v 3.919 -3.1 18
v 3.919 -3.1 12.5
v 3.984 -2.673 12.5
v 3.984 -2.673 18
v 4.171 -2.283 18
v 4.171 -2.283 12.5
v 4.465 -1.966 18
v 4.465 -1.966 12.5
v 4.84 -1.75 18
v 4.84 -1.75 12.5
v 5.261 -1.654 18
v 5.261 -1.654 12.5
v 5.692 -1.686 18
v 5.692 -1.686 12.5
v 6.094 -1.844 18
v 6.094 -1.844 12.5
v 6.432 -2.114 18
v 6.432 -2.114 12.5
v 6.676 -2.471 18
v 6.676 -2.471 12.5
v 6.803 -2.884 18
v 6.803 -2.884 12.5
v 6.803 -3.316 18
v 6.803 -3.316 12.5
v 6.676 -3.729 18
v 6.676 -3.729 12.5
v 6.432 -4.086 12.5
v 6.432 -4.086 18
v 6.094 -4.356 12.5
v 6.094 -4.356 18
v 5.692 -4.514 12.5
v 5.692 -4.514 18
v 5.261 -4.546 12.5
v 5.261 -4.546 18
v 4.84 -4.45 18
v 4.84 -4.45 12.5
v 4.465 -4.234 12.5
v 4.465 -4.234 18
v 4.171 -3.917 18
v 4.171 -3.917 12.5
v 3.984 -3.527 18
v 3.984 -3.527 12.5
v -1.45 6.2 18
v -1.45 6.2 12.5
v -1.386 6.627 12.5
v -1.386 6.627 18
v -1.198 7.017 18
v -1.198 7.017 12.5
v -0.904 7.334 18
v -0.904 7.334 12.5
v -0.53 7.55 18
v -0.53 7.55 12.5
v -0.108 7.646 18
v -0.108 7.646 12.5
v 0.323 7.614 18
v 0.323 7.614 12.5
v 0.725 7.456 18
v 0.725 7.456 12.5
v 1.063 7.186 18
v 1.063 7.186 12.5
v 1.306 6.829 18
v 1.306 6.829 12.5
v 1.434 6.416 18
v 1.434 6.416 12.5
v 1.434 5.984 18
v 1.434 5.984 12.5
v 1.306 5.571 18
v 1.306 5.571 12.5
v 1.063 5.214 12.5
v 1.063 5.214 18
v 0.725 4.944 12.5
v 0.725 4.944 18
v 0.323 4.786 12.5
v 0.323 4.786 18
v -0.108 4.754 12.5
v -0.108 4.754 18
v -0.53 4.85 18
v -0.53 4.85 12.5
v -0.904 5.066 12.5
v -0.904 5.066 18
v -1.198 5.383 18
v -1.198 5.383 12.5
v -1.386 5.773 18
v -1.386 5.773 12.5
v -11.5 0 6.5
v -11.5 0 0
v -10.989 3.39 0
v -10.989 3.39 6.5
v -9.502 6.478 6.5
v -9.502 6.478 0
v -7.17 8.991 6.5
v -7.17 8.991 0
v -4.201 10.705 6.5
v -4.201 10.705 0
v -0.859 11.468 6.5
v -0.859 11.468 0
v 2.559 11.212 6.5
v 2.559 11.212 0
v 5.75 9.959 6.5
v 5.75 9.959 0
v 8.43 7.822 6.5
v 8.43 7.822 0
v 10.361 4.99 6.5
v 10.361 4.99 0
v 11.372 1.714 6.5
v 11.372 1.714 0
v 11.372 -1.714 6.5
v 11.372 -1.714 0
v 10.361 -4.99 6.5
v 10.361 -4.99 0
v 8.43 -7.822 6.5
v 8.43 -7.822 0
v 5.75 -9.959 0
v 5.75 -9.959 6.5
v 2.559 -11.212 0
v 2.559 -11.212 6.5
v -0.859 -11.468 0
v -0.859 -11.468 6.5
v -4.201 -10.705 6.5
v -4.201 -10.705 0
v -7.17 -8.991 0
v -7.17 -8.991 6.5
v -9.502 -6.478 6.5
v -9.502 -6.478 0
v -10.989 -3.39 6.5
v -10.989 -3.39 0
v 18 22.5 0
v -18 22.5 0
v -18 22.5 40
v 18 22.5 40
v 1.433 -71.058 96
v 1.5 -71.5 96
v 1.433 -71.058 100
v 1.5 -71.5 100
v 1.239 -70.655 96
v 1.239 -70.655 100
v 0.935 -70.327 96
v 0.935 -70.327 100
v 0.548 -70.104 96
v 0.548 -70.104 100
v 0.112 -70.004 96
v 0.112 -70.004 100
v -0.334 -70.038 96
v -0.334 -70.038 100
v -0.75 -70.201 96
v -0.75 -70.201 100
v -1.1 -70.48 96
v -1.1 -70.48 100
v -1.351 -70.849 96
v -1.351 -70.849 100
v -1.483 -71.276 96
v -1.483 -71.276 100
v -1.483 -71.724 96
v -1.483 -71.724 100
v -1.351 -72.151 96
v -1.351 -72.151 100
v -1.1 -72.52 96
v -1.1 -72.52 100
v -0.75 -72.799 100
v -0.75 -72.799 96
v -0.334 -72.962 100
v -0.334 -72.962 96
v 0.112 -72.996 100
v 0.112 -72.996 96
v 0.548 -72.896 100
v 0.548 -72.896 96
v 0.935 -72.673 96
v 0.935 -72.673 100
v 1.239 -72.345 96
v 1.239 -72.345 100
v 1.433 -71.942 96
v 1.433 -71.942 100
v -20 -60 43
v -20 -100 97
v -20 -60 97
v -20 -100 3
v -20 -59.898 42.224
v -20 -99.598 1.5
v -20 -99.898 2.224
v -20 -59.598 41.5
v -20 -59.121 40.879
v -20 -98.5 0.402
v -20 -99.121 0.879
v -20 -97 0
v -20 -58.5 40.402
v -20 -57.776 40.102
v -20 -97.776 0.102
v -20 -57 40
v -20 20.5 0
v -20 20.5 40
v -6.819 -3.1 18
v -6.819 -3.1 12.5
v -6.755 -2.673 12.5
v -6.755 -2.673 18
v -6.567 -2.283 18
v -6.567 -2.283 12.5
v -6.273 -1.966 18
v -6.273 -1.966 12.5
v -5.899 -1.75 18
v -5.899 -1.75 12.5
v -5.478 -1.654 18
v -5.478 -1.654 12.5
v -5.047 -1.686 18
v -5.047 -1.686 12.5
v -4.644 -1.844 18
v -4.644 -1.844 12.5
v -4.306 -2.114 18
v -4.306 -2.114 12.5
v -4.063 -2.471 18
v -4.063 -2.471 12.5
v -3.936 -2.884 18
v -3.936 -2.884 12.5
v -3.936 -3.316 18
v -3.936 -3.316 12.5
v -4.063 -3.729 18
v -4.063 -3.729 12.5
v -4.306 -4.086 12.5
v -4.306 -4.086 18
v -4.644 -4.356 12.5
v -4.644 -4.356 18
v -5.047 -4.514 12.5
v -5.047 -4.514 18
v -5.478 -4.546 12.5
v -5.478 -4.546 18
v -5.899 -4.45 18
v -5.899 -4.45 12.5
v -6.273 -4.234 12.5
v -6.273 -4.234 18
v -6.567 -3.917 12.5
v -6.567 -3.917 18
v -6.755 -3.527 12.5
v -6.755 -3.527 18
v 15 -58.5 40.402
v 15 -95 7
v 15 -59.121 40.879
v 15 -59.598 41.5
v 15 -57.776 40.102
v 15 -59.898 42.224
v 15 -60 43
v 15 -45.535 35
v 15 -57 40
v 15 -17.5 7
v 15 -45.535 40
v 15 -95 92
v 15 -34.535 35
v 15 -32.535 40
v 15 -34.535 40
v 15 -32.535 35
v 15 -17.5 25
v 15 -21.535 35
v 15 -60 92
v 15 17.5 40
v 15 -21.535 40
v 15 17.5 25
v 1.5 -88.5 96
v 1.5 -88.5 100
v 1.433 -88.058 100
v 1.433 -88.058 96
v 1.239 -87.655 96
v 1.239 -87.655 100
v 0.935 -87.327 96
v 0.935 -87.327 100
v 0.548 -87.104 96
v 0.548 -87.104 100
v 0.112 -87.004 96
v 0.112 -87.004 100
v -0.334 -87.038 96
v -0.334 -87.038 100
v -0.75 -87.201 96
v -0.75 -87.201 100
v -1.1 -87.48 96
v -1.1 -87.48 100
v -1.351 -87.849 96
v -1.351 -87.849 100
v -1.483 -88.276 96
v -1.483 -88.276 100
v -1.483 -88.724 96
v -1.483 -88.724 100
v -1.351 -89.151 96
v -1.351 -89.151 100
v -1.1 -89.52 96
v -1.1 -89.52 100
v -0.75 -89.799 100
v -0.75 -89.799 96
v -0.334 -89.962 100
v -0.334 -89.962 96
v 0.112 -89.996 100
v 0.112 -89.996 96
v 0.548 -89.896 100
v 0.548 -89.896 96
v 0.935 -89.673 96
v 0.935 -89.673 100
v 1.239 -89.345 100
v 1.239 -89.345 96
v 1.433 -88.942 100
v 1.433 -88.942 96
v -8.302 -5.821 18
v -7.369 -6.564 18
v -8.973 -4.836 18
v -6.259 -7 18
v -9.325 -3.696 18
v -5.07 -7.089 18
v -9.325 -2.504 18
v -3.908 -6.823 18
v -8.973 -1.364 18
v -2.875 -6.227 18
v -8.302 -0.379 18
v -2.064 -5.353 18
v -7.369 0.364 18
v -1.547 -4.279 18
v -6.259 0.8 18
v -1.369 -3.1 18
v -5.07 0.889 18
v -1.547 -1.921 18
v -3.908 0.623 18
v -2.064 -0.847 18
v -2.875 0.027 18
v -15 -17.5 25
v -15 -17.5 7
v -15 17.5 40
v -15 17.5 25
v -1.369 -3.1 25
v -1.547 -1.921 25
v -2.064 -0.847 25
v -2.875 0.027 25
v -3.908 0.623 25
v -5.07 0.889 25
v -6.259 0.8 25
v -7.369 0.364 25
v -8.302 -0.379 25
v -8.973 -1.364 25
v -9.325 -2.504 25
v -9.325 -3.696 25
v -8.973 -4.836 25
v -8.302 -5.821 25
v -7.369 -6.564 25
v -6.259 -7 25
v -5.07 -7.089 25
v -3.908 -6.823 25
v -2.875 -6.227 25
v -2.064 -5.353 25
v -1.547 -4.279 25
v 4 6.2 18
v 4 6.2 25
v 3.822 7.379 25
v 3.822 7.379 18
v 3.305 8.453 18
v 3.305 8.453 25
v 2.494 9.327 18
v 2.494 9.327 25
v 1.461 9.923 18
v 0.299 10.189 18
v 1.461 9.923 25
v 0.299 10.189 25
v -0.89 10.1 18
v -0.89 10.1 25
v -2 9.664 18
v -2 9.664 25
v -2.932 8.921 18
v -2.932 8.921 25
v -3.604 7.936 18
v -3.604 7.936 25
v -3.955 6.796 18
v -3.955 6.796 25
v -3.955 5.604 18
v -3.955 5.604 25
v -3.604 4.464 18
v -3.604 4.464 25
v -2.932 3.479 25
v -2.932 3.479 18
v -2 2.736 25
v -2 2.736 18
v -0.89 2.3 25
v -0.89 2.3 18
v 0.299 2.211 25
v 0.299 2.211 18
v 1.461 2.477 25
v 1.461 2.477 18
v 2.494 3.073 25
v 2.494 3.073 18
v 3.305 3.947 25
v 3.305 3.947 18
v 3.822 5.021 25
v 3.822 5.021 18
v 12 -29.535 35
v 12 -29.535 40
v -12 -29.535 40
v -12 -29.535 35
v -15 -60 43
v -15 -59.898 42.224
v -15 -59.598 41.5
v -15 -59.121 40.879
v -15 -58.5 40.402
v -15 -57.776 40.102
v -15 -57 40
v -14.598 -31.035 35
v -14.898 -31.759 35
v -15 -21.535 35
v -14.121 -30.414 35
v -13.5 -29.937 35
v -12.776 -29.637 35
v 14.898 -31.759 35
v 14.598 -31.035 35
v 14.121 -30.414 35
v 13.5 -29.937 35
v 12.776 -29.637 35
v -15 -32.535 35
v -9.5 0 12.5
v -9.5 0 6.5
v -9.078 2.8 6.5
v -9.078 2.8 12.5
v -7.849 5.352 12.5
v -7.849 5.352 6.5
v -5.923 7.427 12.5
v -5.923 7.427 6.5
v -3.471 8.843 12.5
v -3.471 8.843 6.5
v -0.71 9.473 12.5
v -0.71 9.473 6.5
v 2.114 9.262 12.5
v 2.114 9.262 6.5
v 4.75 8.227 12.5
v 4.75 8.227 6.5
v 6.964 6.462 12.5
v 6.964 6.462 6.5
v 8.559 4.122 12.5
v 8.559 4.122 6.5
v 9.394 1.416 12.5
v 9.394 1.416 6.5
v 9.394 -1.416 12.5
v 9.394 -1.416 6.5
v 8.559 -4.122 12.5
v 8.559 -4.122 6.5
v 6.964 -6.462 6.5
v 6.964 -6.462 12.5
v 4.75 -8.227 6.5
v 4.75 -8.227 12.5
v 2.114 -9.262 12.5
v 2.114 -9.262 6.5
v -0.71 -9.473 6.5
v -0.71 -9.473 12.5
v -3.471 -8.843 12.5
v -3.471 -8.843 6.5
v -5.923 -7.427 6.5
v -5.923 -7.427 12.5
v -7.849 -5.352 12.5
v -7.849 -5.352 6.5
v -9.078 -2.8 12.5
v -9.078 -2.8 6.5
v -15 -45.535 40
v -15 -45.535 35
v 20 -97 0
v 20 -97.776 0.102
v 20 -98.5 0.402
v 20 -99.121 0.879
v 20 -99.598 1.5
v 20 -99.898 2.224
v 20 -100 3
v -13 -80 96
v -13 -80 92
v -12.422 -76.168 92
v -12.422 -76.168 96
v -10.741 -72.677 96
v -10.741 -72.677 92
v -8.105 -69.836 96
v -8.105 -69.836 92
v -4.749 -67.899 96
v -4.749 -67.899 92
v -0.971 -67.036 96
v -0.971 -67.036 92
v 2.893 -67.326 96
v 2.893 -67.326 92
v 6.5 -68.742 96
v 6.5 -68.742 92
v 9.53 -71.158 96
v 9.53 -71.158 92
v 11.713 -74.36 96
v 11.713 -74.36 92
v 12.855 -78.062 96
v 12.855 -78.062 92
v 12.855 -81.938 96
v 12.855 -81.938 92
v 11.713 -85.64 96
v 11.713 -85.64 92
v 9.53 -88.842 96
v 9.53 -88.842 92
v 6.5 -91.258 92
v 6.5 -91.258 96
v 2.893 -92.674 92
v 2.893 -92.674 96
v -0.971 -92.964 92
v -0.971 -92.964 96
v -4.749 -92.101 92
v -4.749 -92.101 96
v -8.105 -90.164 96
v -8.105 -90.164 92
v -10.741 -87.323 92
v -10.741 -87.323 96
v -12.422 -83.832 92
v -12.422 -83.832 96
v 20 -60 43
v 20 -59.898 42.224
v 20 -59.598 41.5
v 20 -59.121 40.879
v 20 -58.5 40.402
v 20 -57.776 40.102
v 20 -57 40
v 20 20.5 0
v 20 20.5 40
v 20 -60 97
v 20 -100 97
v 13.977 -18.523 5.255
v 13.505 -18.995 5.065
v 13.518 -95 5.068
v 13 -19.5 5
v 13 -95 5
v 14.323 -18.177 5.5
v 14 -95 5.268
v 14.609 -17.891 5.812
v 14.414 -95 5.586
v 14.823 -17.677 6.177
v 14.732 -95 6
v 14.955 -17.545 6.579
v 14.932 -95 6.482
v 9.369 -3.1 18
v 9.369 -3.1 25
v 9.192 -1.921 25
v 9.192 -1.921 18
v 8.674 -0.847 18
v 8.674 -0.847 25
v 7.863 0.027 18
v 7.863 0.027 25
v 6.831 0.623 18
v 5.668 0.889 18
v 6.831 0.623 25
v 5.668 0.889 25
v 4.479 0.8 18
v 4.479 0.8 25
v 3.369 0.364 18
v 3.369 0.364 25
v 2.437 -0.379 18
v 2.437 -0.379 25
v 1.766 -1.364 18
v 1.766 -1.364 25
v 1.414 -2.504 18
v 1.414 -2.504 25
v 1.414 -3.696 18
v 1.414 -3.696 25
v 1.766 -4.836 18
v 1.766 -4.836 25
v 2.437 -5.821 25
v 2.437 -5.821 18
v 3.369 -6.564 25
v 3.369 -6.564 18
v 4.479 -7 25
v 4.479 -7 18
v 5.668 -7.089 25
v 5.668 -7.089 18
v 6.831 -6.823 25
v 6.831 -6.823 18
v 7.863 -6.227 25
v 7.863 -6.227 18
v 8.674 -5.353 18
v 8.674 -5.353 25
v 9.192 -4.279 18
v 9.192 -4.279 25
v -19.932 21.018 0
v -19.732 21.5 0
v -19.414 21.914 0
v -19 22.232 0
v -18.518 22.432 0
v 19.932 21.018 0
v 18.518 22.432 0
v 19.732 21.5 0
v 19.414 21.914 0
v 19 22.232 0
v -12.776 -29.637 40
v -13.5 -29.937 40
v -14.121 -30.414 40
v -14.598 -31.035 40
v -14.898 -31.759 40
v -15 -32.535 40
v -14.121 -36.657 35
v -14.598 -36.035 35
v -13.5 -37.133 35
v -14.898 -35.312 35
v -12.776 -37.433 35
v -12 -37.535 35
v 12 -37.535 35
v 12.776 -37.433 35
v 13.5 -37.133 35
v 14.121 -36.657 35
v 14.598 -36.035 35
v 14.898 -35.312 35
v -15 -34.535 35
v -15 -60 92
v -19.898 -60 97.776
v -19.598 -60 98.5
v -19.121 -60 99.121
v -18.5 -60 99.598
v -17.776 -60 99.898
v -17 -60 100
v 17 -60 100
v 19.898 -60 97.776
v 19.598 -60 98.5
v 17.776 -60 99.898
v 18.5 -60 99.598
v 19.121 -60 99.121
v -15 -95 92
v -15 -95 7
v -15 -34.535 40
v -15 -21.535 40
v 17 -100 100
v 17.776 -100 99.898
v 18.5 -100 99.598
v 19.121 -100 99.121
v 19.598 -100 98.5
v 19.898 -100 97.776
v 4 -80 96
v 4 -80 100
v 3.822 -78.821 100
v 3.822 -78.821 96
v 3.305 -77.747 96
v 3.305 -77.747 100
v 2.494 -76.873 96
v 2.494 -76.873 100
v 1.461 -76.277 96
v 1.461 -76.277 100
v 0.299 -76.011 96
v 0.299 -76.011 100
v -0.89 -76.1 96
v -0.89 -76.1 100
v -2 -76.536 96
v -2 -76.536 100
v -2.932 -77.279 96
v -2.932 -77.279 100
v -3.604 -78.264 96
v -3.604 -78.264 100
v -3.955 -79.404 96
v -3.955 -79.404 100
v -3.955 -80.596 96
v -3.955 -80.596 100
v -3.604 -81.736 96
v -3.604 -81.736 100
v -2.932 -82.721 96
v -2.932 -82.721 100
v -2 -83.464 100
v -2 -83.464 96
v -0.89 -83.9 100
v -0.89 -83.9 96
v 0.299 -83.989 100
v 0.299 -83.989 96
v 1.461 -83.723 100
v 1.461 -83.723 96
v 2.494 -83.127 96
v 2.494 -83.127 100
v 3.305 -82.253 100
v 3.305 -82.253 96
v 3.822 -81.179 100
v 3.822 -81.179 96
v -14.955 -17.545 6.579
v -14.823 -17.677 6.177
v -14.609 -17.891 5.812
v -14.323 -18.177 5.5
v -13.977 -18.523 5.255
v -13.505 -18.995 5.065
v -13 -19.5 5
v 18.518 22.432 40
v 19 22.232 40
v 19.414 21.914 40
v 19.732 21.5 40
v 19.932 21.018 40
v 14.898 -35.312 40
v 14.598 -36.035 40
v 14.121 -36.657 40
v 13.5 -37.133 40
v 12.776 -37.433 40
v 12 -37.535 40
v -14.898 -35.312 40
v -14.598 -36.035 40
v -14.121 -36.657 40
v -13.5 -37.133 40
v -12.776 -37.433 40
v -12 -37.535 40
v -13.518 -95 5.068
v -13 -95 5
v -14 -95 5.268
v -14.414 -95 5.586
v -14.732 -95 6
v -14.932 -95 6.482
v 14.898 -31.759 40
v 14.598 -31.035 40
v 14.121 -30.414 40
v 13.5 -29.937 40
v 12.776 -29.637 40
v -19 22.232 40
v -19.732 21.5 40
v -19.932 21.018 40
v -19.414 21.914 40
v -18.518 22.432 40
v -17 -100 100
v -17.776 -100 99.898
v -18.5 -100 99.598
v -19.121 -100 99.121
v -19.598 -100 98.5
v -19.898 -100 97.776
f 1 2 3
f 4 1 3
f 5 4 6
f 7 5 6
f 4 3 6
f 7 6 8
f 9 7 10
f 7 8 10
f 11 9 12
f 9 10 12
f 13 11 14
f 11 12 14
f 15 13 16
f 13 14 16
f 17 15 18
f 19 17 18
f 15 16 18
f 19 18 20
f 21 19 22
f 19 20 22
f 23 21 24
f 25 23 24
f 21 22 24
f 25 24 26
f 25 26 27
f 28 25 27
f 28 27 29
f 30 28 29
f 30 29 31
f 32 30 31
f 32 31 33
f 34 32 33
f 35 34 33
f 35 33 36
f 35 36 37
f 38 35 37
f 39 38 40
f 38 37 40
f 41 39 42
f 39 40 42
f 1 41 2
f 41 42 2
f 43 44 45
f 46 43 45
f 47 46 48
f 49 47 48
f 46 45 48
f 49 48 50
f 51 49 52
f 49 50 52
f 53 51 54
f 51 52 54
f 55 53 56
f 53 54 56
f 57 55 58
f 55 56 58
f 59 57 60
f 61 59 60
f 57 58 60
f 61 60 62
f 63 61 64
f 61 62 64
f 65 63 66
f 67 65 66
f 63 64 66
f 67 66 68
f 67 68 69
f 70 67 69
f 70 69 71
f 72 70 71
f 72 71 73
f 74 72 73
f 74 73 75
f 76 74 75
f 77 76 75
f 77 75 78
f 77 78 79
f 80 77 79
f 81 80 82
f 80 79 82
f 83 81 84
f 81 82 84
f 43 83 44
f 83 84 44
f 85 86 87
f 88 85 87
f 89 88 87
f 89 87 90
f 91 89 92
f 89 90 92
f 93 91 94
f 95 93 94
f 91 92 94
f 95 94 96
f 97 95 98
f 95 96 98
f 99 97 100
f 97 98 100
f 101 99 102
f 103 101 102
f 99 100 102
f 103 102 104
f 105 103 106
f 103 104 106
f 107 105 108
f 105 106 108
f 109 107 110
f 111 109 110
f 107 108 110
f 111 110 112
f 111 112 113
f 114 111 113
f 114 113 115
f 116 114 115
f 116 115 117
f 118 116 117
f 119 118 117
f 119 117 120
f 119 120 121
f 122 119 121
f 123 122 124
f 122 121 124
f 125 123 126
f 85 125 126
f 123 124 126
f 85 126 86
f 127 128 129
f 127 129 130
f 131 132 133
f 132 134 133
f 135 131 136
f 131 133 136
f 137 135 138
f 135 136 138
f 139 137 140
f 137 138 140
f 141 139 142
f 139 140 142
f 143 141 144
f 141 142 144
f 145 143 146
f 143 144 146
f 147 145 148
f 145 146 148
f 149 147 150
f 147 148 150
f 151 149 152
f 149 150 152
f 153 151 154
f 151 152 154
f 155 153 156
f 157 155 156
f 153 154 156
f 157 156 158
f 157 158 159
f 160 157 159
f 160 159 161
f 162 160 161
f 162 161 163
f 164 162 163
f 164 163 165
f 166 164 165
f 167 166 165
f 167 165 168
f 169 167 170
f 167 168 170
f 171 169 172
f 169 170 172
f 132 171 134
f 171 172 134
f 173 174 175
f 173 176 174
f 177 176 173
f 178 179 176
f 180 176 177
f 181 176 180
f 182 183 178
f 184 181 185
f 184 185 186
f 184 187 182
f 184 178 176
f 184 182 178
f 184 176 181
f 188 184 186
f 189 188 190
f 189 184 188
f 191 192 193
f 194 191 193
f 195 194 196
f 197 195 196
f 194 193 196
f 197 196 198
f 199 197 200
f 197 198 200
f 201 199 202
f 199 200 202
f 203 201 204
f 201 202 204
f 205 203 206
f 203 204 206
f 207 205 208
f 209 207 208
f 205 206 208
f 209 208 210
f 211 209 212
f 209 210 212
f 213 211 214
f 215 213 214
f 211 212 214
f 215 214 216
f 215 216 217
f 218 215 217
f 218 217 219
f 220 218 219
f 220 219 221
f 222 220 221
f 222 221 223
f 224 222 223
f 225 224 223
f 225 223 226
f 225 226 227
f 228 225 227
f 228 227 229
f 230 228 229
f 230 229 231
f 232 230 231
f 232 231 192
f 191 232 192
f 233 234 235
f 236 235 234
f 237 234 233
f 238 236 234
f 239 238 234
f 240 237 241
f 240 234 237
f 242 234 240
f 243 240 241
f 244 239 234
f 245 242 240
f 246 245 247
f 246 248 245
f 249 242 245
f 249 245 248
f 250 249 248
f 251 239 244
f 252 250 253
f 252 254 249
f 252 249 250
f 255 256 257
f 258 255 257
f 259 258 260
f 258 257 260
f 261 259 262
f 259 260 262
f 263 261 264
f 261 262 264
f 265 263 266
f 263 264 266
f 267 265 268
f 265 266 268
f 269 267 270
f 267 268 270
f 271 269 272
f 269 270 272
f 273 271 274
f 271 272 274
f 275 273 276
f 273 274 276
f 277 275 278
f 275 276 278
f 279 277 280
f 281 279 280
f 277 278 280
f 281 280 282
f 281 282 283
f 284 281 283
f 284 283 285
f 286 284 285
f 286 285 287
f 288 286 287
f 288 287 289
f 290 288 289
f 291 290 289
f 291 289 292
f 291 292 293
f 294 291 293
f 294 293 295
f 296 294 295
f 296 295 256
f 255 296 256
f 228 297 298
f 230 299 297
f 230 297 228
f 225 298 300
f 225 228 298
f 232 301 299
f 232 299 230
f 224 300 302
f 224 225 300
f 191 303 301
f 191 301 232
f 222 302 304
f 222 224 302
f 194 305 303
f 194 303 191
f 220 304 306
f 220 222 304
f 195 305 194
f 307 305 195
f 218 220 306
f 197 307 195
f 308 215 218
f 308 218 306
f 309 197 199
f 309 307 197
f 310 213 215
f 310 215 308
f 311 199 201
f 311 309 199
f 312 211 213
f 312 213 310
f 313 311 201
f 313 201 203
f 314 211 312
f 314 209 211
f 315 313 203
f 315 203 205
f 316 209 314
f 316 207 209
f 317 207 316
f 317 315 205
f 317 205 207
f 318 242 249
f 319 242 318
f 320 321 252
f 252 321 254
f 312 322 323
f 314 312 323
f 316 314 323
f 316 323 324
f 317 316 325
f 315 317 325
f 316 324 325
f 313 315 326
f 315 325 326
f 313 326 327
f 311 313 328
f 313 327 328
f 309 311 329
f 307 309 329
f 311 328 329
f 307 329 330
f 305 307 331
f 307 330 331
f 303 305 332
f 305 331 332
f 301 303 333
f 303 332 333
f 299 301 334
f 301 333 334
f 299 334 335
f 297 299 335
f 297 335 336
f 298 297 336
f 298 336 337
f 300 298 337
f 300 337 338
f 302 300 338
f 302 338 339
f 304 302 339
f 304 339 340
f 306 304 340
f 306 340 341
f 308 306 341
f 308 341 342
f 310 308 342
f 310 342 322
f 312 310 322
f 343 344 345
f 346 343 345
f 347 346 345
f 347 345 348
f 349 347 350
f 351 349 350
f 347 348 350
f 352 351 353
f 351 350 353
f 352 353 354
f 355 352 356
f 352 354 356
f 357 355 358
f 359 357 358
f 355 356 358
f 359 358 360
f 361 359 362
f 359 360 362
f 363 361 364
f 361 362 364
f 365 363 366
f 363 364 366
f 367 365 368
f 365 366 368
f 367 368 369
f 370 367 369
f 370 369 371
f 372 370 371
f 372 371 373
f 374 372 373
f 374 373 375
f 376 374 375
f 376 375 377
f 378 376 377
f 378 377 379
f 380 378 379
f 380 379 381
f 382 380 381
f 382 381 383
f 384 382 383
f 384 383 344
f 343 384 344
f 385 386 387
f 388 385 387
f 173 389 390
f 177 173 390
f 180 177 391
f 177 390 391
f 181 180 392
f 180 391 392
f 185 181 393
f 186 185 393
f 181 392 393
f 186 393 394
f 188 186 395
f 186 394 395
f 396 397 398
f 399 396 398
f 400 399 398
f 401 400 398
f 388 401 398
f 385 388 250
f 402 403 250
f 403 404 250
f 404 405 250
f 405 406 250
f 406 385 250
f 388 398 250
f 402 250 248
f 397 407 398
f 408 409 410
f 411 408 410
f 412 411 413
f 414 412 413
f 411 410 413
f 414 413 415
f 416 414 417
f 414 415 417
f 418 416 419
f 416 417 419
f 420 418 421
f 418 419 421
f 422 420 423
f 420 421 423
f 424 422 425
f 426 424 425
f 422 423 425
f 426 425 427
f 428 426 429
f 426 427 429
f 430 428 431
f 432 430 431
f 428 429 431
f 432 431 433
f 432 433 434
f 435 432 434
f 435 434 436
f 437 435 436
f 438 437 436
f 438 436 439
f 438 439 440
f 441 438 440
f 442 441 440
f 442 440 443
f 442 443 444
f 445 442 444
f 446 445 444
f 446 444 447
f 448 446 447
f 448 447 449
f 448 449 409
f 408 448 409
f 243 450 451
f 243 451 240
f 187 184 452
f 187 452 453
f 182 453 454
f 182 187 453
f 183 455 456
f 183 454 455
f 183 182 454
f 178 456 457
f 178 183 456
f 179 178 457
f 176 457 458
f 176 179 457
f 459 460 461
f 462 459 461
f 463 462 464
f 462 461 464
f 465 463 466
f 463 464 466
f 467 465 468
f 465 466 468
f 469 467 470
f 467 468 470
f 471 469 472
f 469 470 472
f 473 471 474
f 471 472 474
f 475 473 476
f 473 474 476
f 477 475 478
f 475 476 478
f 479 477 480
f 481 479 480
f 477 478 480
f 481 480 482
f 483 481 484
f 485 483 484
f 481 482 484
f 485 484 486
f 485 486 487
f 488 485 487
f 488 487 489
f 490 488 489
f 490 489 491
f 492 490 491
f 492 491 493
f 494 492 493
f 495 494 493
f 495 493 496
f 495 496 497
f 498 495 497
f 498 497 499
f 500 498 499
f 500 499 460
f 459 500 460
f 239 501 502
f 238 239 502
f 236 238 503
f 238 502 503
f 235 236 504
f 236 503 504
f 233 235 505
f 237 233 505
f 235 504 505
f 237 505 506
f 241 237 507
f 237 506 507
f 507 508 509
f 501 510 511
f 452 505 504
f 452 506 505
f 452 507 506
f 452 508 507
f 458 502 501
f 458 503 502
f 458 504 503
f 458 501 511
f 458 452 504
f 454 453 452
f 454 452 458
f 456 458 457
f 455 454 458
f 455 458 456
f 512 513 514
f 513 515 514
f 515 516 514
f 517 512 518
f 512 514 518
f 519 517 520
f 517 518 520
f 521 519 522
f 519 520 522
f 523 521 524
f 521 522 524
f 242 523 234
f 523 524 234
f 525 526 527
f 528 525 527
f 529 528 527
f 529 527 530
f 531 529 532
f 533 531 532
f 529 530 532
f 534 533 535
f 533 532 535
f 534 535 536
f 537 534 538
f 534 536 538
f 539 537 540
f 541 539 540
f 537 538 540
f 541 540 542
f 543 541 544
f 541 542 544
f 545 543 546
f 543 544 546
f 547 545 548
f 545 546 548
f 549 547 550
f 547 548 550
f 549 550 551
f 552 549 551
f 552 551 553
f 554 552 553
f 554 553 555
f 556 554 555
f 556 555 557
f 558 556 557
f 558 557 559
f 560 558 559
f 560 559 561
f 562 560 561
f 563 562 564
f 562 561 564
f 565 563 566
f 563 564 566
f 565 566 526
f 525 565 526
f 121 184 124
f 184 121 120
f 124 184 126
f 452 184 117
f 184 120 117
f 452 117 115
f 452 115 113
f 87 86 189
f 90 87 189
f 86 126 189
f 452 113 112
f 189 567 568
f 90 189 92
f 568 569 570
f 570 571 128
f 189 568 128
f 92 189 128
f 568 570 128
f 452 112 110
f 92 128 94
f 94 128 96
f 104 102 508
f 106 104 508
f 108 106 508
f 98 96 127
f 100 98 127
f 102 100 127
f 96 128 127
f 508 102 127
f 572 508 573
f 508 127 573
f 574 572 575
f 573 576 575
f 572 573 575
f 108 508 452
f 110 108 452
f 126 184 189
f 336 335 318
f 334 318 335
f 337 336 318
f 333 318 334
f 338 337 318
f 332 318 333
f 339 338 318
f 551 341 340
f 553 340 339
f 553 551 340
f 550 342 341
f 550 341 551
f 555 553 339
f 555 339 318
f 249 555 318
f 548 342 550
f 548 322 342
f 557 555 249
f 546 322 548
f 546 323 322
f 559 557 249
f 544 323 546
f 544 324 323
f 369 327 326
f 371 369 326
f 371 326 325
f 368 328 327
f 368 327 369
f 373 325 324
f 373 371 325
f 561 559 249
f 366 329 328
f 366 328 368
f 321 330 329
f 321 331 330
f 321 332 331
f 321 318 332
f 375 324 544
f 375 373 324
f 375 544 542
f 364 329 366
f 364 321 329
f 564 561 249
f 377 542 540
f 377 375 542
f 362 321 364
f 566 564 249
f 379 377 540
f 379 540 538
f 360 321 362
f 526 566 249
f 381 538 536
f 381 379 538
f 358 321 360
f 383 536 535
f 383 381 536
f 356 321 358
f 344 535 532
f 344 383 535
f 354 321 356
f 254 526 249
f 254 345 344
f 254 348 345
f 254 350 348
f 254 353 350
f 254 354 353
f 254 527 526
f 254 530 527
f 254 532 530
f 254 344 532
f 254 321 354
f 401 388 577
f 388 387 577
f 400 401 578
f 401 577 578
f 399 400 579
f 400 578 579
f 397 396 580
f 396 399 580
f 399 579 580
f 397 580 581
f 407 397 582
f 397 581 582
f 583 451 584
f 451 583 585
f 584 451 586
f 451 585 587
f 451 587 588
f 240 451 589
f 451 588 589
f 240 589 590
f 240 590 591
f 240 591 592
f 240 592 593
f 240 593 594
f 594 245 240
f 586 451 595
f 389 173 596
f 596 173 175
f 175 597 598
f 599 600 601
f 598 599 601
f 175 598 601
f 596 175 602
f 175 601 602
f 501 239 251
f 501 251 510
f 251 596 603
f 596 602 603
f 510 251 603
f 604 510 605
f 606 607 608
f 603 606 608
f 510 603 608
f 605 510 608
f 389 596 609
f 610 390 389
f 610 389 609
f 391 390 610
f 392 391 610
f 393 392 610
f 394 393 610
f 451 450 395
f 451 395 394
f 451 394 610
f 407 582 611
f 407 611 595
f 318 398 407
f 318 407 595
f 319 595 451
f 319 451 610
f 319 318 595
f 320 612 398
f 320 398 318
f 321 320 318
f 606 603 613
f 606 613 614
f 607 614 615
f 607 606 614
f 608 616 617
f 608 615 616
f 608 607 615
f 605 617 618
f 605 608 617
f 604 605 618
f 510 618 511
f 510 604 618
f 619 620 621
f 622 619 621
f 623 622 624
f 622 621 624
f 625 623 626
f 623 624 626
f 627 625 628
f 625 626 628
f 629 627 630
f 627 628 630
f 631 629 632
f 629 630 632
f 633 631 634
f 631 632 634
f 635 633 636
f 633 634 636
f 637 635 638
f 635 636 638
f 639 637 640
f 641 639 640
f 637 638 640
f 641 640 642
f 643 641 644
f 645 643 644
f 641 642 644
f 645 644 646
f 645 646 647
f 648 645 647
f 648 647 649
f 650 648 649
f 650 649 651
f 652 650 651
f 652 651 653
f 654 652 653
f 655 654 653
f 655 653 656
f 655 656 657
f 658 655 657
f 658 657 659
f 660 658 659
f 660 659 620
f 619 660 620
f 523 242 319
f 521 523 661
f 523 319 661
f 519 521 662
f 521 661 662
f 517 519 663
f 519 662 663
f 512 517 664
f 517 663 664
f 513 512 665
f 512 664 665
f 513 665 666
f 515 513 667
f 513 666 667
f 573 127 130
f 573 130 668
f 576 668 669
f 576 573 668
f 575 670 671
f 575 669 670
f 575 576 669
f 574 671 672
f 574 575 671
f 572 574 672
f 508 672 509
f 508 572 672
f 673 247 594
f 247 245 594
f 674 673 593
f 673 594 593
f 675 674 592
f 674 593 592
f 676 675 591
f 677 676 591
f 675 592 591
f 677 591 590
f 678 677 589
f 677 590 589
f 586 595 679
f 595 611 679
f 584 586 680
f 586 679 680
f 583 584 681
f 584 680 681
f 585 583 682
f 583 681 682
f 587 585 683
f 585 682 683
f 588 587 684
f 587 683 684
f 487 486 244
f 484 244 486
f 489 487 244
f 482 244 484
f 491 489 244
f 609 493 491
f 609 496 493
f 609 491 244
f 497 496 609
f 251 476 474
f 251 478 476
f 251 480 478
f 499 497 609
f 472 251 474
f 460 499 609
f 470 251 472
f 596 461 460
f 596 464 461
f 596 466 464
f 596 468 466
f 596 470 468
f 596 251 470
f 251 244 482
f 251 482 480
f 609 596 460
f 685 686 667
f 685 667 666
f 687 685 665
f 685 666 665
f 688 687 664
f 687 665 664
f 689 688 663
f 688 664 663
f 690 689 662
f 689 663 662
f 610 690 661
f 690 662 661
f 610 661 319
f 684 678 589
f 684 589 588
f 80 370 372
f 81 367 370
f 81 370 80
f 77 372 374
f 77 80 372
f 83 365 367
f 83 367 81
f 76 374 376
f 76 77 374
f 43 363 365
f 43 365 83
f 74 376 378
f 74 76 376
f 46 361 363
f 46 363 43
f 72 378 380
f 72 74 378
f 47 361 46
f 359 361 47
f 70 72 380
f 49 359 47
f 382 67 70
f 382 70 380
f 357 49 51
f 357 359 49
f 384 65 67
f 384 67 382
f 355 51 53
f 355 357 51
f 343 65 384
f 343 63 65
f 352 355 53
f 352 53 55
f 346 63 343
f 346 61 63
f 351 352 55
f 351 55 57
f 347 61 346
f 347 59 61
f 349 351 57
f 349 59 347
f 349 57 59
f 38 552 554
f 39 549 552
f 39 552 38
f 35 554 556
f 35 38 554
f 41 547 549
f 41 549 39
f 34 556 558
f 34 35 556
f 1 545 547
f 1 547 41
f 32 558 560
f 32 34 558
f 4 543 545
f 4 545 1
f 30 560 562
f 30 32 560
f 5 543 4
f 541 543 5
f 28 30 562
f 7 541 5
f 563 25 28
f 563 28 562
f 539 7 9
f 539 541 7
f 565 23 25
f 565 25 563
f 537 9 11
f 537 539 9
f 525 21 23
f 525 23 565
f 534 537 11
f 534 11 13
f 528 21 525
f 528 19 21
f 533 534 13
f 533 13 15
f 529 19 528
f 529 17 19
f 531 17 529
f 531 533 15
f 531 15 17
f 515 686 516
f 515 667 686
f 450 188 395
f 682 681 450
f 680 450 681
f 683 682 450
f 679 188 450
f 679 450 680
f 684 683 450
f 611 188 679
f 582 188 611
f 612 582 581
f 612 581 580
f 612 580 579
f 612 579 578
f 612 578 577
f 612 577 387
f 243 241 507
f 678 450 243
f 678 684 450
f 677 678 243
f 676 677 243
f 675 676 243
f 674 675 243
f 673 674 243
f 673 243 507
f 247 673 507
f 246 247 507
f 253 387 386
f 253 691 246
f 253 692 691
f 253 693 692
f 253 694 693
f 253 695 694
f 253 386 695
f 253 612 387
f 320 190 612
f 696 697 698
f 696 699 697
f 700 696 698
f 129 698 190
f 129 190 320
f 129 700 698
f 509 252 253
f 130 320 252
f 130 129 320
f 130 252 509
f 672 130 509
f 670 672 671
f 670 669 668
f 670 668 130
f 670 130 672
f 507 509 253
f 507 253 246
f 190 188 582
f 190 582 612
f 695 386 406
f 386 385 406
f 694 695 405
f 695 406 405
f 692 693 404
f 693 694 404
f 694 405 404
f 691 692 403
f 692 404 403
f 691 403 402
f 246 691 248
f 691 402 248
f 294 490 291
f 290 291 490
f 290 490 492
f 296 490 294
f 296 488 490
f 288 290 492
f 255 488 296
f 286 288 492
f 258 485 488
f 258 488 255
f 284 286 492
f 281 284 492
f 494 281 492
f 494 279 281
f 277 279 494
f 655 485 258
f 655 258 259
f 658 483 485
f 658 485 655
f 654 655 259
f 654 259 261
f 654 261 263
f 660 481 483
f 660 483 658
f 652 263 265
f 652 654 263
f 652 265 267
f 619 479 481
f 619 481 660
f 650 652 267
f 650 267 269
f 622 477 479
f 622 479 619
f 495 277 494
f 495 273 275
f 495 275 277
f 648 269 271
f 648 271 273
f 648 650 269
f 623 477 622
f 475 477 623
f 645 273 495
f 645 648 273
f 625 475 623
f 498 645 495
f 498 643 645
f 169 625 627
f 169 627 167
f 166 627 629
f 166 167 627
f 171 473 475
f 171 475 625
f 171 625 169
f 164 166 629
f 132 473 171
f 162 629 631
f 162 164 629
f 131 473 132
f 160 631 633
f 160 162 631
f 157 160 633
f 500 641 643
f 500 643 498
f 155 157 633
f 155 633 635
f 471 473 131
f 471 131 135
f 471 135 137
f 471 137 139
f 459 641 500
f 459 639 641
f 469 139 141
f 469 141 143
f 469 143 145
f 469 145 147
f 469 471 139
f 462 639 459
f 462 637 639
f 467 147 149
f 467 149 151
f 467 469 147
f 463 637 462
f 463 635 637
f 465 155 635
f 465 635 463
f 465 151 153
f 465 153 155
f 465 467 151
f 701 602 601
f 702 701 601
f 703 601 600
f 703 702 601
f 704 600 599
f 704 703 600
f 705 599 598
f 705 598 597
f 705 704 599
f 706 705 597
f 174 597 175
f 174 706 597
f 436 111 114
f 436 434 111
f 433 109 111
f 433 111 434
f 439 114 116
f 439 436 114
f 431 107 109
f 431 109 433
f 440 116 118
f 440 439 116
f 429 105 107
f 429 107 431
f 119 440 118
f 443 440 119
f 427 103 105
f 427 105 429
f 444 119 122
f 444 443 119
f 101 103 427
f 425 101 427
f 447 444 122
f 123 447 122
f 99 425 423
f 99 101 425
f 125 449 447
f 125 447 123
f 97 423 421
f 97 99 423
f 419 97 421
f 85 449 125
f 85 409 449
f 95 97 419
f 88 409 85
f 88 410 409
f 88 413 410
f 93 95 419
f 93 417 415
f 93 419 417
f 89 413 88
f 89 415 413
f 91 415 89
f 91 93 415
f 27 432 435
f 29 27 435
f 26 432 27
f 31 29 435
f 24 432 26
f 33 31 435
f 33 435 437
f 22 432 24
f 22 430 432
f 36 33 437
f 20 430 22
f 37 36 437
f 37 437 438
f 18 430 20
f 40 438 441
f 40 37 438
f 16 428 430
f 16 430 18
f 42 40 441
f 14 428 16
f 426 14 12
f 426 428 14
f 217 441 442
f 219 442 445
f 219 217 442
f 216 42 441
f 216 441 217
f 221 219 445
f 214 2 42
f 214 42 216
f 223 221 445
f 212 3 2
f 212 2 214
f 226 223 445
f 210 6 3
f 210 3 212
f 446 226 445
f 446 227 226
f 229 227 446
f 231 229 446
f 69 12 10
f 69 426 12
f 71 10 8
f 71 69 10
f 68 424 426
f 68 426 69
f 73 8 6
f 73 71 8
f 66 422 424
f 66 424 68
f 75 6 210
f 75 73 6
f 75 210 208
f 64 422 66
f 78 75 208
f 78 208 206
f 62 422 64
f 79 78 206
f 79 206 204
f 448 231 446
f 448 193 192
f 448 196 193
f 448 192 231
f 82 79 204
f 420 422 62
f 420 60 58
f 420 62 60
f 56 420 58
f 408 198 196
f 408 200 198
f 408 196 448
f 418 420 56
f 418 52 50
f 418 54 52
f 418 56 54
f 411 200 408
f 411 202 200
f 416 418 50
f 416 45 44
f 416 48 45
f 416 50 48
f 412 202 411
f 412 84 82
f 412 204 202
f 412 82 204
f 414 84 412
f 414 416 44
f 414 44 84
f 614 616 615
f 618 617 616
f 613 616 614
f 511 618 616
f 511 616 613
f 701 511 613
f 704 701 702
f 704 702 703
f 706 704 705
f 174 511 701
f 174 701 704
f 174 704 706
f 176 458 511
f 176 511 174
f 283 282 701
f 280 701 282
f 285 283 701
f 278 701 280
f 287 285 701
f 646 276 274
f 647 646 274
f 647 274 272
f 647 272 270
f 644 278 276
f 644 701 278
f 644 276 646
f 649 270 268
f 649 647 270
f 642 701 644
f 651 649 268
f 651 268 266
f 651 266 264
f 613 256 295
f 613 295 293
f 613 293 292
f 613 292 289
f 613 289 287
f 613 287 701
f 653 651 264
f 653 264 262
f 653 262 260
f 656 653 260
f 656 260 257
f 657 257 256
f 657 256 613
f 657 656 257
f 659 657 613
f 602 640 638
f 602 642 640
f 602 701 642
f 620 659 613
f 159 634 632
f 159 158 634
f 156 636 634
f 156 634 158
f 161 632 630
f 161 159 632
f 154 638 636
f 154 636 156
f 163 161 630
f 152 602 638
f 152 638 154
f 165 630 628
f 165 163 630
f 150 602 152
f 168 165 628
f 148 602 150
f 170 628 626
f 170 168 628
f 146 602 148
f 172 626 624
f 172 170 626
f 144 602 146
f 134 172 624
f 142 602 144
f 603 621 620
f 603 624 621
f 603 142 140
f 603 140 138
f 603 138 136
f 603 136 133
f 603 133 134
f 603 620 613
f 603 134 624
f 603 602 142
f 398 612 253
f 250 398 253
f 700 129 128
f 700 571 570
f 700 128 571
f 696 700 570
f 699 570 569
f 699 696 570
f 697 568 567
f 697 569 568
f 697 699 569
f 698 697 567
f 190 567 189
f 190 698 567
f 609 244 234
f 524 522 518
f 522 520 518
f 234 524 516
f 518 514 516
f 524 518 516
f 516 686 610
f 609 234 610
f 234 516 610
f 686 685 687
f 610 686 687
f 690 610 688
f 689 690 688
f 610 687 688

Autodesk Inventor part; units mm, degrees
ref_plane "YZ Plane" through (0, 0, 0) normal (1, 0, 0) x (0, 1, 0)
ref_plane "XZ Plane" through (0, 0, 0) normal (0, 1, 0) x (-1, 0, 0)
ref_plane "XY Plane" through (0, 0, 0) normal (0, 0, 1) x (1, 0, 0)
sketch "Sketch1" plane through (0, 0, 0) normal (0, 0, 1) x (1, 0, 0)
  line L0 (-20, 22.5) -> (20, 22.5)
  line L1 (20, 22.5) -> (20, -100)
  line L2 (20, -100) -> (-20, -100)
  line L3 (-20, -100) -> (-20, 22.5)
  circle A0 centre (0, 0) radius 2.5
  dimension "d0" = 122.5
  dimension "d1" = 40
  dimension "d2" = 20
  dimension "d3" = 22.5
  dimension "d4" = 5
extrude "Extrusion1" add sketch "Sketch1" along normal blind 5
sketch "Sketch2" plane through (0, 0, 5) normal (0, 0, 1) x (1, 0, 0)
  line L0 (20, 22.5) -> (-20, 22.5) projected
  line L1 (-20, -100) -> (20, -100) projected
  line L2 (-20, 22.5) -> (20, 22.5)
  line L3 (20, 22.5) -> (20, -100)
  line L4 (20, -100) -> (-20, -100)
  line L5 (-20, -100) -> (-20, 22.5)
  line L6 (15, -95) -> (-15, -95)
  line L7 (-15, -95) -> (-15, 17.5)
  line L8 (-15, 17.5) -> (15, 17.5)
  line L9 (15, 17.5) -> (15, -95)
  point P0 (0, 0)
  dimension "d7" = 5
  dimension "d8" = 5
  dimension "d9" = 5
  dimension "d10" = 5
extrude "Extrusion2" add sketch "Sketch2" along normal blind 35
sketch "Sketch3" plane through (-20, -100, 0) normal (0, -1, 0) x (1, 0, 0)
  circle A0 centre (20, 20) radius 8.5
  line L0 (40, 0) -> (40, 40) projected
  line L1 (0, 0) -> (40, 0) projected
  circle A1 centre (20, 11.5) radius 1.5
  circle A2 centre (20, 28.5) radius 1.5
  circle A3 centre (20, 20) radius 3.75
  line L2 (0, 0) -> (0, 40) projected
  point P0 (20, 0)
  dimension "d13" = 20
  dimension "d14" = 20
  dimension "d15" = 17
  dimension "d16" = 3
  dimension "d17" = 7.5
  dimension "d18" = 3
  dimension "d19" = 20
  dimension "d20" = 20
sketch "Sketch4" plane through (0, 0, 5) normal (0, 0, 1) x (1, 0, 0)
  line L0 (-15, 17.5) -> (-15, -95) projected
  line L1 (15, 17.5) -> (15, -95) projected
  line L2 (-15, 17.5) -> (15, 17.5)
  line L3 (15, 17.5) -> (15, -17.5)
  line L4 (15, -17.5) -> (-15, -17.5)
  line L5 (-15, -17.5) -> (-15, 17.5)
  point P0 (0, 0)
  point P1 (-15, -17.5)
  dimension "d21" = 35
extrude "Extrusion3" add sketch "Sketch4" along normal blind 20
sketch "Sketch5" plane through (0, 0, 0) normal (0, 0, -1) x (-1, 0, 0)
  circle A0 centre (0, 0) radius 2.5 projected
  circle A1 centre (0, 0) radius 9.5
  dimension "d24" = 19
extrude "Extrusion4" cut sketch "Sketch5" against normal blind 12.5 contours A0 | A1
sketch "Sketch6" plane through (0, 0, 0) normal (0, 0, -1) x (-1, 0, 0)
  circle A0 centre (0, 0) radius 11.5
  dimension "d27" = 23
extrude "Extrusion5" cut sketch "Sketch6" against normal blind 6.5
fillet "Fillet1" radius 2 2 edges at (-20, 22.5, 20) (20, 22.5, 20)
sketch "Sketch7" plane through (0, 0, 0) normal (0, 0, -1) x (-1, 0, 0)
  circle A0 centre (0, 0) radius 6.2
  circle A1 centre (0, 6.2) radius 1.45
  line L0 (0, 6.2) -> (0, 0)
  line L1 (0, 0) -> (6.4707, -3.7359)
  line L2 (0, 0) -> (-6.6791, -3.8562)
  circle A2 centre (5.3694, -3.1) radius 1.45
  circle A3 centre (-5.3694, -3.1) radius 1.45
  dimension "d31" = 12.4
  dimension "d32" = 120
  dimension "d33" = 120
  dimension "d34" = 2.9
  dimension "d35" = 2.9
  dimension "d36" = 2.9
extrude "Extrusion6" cut sketch "Sketch7" against normal blind 25 contours A1 L0 A0 | A0 A1 | A2 A0 | A0 L1 A2 | L0 A1 A0 | A0 A2 L1 | A3 L2 A0 | A0 L2 A3 | A3 A0 L2 | A3 L2 A0
sketch "Sketch8" plane through (0, 0, 25) normal (0, 0, 1) x (1, 0, 0)
  circle A0 centre (5.3694, -3.1) radius 1.45 projected
  circle A1 centre (5.3694, -3.1) radius 4
  circle A2 centre (-5.3694, -3.1) radius 1.45 projected
  circle A3 centre (-5.3694, -3.1) radius 4
  circle A4 centre (0, 6.2) radius 1.45 projected
  circle A5 centre (0, 6.2) radius 4
  point P0 (0, 0)
  dimension "d39" = 8
  dimension "d40" = 8
  dimension "d41" = 8
extrude "Extrusion7" cut sketch "Sketch8" against normal blind 7
fillet "Fillet2" radius 2 3 edges at (0, -17.5, 5) (-15, -56.25, 5) (15, -56.25, 5)
sketch "Sketch9" plane through (0, 0, 40) normal (0, 0, 1) x (1, 0, 0)
  line L0 (20, -100) -> (20, 20.5) projected
  line L1 (-20, 20.5) -> (-20, -100) projected
  line L2 (20, -100) -> (-20, -100)
  line L3 (-20, -100) -> (-20, -60)
  line L4 (-20, -60) -> (20, -60)
  line L5 (20, -60) -> (20, -100)
  line L6 (0, -60) -> (-20, -60)
  line L7 (-20, -60) -> (-20, -100)
  line L8 (-20, -100) -> (0, -100)
  line L9 (0, -100) -> (0, -60)
  line L10 (15, -95) -> (-15, -95) projected
  line L11 (15, -65) -> (-15, -65)
  line L12 (-15, -65) -> (-15, -95)
  line L13 (-15, -95) -> (15, -95)
  line L14 (15, -95) -> (15, -65)
  point P0 (0, 0)
  dimension "d45" = 40
  dimension "d46" = 5
  dimension "d47" = 5
extrude "Extrusion8" add sketch "Sketch9" along normal blind 60 contours L2 L9 L10 L14 L11 L4 L0 | L2 L1 L4 L9 L11 L12 L10
sketch "Sketch10" plane through (0, 0, 100) normal (0, 0, 1) x (1, 0, 0)
  line L0 (-20, -100) -> (20, -100) projected
  line L1 (20, -100) -> (20, 20.5) projected
  line L2 (-20, -100) -> (20, -100)
  line L3 (20, -100) -> (20, -60)
  line L4 (20, -60) -> (-20, -60)
  line L5 (-20, -60) -> (-20, -100)
  point P0 (0, 0)
  dimension "d50" = 40
extrude "Extrusion9" add sketch "Sketch10" against normal blind 5
sketch "Sketch11" plane through (0, 0, 100) normal (0, 0, 1) x (1, 0, 0)
  circle A0 centre (0, -80) radius 8.5
  line L0 (20, -100) -> (20, -60) projected
  line L1 (-20, -100) -> (20, -100) projected
  circle A1 centre (0, -71.5) radius 1.5
  circle A2 centre (0, -88.5) radius 1.5
  line L2 (-20, -60) -> (-20, -100) projected
  circle A3 centre (0, -80) radius 4
  point P0 (0, 0)
  dimension "d53" = 20
  dimension "d54" = 20
  dimension "d55" = 17
  dimension "d56" = 3
  dimension "d57" = 3
  dimension "d58" = 20
  dimension "d59" = 20
  dimension "d62" = 8
extrude "Extrusion10" cut sketch "Sketch11" against normal blind 5 contours A1 A0 | A0 A1 | A2 A0 | A0 A2 | A3
sketch "Sketch12" plane through (-15, -60, 40) normal (0, 1, 0) x (1, 0, 0)
  line L0 (0, 0) -> (30, 0) projected
  line L1 (0, 0) -> (30, 0)
  line L2 (30, 0) -> (30, -55)
  line L3 (30, -55) -> (0, -55)
  line L4 (0, -55) -> (0, 0)
  point P0 (15, 40)
extrude "Extrusion11" cut sketch "Sketch12" against normal blind 5
sketch "Sketch13" plane through (0, 0, 40) normal (0, 0, 1) x (1, 0, 0)
  line L0 (-20, 20.5) -> (-20, -100) projected
  line L1 (20, -60) -> (20, 20.5) projected
  line L2 (-20, -21.5352) -> (20, -21.5352)
  line L3 (20, -21.5352) -> (20, -29.5352)
  line L4 (20, -29.5352) -> (-20, -29.5352)
  line L5 (-20, -29.5352) -> (-20, -21.5352)
  line L6 (20, -37.5352) -> (-20, -37.5352)
  line L7 (-20, -37.5352) -> (-20, -45.5352)
  line L8 (-20, -45.5352) -> (20, -45.5352)
  line L9 (20, -45.5352) -> (20, -37.5352)
  point P0 (0, 0)
  point P1 (-20, -37.5352)
  point P2 (-20, -29.5352)
  point P3 (20, -21.5352)
  dimension "d65" = 8
  dimension "d66" = 8
  dimension "d67" = 8
extrude "Extrusion12" add sketch "Sketch13" against normal blind 5 contours L2 L1 L4 L0 | L6 L1 L8 L0
fillet "Fillet3" radius 3 4 edges at (15, -29.5352, 37.5) (15, -37.5352, 37.5) (-15, -29.5352, 37.5) (-15, -37.5352, 37.5)
sketch "Sketch14" plane through (0, 0, 95) normal (0, 0, -1) x (-1, 0, 0)
  line L0 (15, -95) -> (-15, -95) projected
  line L1 (-15, -95) -> (15, -95)
  line L2 (15, -95) -> (15, -60)
  line L3 (15, -60) -> (-15, -60)
  line L4 (-15, -60) -> (-15, -95)
  circle A0 centre (0, -80) radius 4 projected
  circle A1 centre (0, -80) radius 4
  circle A2 centre (0, -71.5) radius 1.5 projected
  circle A3 centre (0, -71.5) radius 1.5
  circle A4 centre (0, -88.5) radius 1.5 projected
  circle A5 centre (0, -88.5) radius 1.5
  point P0 (0, 0)
extrude "Extrusion13" add sketch "Sketch14" along normal blind 3
sketch "Sketch15" plane through (0, 0, 92) normal (0, 0, -1) x (-1, 0, 0)
  circle A0 centre (0, -80) radius 4 projected
  circle A1 centre (0, -80) radius 13
  point P0 (0, 0)
  dimension "d73" = 26
extrude "Extrusion14" cut sketch "Sketch15" against normal blind 4 contours A0 | A1
fillet "Fillet4" radius 3 5 edges at (-20, -80, 100) (20, -80, 100) (-17.5, -60, 40) (17.5, -60, 40) (0, -100, 0)
properties part number "Link4_v2"
